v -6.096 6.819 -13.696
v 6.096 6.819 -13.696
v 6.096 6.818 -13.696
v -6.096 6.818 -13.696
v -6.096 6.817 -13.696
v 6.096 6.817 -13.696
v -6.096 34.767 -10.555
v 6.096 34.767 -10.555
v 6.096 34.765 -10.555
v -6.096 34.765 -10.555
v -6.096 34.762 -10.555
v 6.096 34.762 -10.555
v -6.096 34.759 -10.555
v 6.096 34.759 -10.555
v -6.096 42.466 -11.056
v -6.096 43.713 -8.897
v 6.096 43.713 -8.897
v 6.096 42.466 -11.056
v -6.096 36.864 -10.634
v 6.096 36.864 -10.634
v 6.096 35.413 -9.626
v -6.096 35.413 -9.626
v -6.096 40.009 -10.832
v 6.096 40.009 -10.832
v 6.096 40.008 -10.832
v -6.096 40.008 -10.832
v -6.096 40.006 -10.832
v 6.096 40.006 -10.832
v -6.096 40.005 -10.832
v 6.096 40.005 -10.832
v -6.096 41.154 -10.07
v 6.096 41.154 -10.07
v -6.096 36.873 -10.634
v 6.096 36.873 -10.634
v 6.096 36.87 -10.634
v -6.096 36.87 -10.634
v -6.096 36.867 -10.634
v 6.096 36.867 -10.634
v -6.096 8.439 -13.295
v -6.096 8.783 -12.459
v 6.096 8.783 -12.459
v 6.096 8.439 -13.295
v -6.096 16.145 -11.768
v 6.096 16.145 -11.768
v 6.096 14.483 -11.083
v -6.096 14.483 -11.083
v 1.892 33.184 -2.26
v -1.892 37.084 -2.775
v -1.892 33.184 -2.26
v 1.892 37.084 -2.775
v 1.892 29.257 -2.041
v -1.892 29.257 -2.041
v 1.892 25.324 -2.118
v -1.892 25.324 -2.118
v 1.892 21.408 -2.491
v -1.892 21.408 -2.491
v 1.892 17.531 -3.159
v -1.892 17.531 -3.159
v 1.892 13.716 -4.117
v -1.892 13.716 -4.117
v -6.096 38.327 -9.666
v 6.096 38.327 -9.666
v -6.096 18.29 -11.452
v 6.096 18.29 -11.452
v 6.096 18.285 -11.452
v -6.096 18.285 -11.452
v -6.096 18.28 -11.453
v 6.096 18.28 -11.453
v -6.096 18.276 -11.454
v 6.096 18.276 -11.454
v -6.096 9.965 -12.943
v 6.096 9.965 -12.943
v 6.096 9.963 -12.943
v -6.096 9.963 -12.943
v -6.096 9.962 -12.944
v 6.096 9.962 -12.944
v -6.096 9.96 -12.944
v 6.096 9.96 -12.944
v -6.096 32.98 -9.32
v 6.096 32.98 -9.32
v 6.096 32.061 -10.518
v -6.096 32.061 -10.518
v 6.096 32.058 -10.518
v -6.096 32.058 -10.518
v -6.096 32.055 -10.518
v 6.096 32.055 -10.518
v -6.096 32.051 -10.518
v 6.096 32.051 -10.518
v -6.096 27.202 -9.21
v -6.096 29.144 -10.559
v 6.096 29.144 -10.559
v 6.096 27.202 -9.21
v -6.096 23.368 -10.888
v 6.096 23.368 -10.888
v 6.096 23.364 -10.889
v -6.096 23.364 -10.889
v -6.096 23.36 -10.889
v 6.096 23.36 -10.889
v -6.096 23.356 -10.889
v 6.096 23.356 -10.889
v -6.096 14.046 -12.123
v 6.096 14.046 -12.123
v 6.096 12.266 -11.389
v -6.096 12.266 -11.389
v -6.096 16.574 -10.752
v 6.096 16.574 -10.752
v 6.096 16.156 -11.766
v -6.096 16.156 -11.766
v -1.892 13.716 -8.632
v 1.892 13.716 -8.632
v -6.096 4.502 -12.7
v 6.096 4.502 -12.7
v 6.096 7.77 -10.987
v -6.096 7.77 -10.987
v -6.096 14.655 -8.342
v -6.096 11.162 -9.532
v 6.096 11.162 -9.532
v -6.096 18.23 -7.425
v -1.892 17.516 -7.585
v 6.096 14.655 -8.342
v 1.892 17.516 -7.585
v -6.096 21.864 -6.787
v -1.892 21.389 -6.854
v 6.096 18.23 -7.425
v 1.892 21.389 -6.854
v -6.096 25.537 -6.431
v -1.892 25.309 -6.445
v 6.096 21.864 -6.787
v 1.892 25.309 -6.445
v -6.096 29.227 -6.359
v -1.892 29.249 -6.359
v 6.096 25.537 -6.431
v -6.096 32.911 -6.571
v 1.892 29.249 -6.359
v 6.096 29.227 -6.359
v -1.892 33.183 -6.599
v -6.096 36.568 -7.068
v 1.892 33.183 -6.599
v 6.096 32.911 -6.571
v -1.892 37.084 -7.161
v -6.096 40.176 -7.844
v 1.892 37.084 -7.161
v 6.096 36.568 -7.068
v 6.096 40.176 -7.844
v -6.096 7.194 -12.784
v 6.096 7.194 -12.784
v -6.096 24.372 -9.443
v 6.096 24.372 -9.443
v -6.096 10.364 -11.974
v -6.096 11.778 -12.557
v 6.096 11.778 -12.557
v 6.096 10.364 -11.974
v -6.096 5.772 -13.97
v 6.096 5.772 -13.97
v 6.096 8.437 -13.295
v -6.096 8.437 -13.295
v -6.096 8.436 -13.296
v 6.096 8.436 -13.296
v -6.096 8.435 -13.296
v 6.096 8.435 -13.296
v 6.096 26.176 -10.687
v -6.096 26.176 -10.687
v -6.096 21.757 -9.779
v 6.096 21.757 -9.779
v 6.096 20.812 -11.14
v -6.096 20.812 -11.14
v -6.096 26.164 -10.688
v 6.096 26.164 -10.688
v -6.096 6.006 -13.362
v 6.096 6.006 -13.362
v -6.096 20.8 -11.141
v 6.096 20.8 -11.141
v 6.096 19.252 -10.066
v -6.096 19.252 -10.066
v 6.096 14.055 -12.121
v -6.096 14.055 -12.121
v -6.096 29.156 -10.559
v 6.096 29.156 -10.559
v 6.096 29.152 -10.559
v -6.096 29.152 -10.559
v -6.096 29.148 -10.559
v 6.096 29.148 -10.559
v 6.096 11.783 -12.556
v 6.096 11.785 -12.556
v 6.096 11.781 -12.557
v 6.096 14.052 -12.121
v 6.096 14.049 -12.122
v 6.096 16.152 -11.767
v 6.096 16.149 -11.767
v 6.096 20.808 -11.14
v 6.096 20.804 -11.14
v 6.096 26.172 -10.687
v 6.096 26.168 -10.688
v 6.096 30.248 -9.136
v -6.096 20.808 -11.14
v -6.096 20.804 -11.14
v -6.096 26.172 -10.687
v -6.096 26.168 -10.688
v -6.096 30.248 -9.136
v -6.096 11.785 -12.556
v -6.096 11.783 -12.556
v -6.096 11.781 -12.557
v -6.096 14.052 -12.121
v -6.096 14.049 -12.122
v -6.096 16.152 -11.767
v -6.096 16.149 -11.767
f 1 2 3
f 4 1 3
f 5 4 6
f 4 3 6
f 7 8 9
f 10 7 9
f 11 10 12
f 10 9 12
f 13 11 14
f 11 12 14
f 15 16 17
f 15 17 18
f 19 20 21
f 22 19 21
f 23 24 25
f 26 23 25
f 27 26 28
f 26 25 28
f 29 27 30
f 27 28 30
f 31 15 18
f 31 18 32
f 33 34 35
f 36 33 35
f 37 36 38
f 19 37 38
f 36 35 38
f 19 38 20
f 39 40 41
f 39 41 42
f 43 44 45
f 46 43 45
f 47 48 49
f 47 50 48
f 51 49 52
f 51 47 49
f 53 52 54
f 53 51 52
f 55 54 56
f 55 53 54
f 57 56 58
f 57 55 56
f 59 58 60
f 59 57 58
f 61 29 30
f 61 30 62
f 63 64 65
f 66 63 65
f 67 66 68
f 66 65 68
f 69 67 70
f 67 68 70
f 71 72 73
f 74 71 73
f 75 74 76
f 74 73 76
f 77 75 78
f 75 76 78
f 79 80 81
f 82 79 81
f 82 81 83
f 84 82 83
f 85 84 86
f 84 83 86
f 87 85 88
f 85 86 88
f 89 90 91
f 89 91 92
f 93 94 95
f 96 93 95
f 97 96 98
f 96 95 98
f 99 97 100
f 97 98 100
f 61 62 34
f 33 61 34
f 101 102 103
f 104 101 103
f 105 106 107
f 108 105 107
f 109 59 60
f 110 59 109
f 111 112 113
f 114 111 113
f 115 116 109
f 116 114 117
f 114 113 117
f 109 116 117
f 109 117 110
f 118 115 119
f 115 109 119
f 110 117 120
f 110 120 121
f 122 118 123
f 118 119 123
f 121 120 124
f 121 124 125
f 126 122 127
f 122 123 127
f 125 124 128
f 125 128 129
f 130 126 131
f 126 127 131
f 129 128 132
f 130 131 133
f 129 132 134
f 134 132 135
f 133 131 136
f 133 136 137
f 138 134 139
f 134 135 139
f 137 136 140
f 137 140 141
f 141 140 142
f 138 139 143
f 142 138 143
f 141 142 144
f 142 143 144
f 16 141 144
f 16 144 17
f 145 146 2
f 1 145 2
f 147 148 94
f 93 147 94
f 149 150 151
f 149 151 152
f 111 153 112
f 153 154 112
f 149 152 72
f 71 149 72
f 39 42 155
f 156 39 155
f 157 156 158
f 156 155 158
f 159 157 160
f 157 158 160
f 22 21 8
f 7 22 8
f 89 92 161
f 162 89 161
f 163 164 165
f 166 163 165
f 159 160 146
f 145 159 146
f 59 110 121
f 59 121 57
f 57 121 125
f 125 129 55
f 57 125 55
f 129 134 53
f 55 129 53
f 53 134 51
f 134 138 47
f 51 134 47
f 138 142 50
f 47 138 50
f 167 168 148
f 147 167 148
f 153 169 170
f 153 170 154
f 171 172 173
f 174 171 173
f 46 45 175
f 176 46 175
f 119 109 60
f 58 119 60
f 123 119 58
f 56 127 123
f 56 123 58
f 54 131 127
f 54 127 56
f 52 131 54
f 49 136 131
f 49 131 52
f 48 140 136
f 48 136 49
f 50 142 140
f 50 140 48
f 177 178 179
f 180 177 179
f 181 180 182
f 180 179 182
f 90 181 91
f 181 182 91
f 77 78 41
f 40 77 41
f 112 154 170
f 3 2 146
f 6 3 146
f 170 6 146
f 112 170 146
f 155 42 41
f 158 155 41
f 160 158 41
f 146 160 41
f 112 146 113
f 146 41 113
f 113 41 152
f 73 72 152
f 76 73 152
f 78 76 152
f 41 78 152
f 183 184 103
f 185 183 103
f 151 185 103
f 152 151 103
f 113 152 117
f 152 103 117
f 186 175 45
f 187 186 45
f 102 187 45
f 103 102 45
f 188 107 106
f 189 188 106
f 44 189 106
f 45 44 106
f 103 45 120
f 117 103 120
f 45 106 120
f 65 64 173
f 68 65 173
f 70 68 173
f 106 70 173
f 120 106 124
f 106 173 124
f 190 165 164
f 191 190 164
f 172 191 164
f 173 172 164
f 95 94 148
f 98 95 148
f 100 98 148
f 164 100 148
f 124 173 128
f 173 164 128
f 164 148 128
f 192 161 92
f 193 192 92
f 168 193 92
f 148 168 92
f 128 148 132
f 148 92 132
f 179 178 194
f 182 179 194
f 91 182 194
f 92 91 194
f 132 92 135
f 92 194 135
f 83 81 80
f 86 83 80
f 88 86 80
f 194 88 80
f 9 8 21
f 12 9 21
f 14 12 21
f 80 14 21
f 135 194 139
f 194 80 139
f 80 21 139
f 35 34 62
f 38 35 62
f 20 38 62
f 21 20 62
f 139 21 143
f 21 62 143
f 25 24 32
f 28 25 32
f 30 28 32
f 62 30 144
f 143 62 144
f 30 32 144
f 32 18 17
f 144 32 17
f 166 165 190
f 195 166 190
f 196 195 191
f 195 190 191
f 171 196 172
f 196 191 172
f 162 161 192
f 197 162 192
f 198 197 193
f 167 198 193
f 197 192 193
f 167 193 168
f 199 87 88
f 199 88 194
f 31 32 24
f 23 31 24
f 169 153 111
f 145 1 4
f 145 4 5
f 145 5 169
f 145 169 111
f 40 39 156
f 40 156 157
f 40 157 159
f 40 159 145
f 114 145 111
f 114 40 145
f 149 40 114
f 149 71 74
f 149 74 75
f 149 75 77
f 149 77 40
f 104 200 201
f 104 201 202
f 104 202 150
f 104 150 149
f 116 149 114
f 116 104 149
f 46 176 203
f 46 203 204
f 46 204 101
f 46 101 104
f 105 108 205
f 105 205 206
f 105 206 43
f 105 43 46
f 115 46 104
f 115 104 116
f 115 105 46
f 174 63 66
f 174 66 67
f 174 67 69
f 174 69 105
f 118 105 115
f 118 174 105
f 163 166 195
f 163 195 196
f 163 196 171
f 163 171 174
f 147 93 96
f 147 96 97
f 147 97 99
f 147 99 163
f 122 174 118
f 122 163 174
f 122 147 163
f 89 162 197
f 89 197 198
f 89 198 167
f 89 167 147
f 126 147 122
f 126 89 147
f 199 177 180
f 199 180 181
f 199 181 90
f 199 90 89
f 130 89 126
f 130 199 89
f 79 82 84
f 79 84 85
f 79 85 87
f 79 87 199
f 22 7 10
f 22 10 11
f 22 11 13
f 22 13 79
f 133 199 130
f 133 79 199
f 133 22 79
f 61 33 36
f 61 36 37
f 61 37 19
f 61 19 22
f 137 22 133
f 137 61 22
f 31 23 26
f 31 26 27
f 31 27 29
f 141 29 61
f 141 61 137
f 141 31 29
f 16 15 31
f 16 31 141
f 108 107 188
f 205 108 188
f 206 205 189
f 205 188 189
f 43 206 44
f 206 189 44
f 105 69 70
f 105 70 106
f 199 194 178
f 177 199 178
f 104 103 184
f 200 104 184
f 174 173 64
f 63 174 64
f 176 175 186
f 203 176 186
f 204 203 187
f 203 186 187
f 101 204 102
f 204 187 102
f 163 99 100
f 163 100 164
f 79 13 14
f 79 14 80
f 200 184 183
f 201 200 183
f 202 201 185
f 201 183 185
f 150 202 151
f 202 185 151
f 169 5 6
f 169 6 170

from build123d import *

# Parameters (mm, degrees)
Y_KSEKLIK_EKSTR_ZYON1_DEPTH = 1.8922999999999999
Y_KSEKLIK_EKSTR_ZYON2_DEPTH = 6.096
KES_EKSTR_ZYON1_DEPTH       = 12.192
KES_EKSTR_ZYON2_DEPTH       = 12.192


with BuildPart() as part:
    # Sketch1 → Yükseklik-Ekstrüzyon1 (new, symmetric)
    with BuildSketch(Plane(origin=(0, 0, 0), x_dir=(0, 0, -1), z_dir=(1, 0, 0))):
        with BuildLine():
            Line((12.699999999999989, 4.50157994432155), (13.96999999999999, 5.771579944321538))
            ThreePointArc((13.969999999999999, 5.771579944321534), (10.575518689521203, 28.624343729041474), (12.431741890335203, 51.65314637694648))
            ThreePointArc((12.43174189033521, 51.65314637694648), (9.202455413232371, 44.58343593858319), (7.160995779393552, 37.0840000000003))
            Line((7.160995779393725, 37.084000000000266), (2.774818775530208, 37.08399999999997))
            ThreePointArc((2.774818775530207, 37.08399999999997), (2.117821695541153, 25.3237007401097), (4.117213446385989, 13.715999999999998))
            Line((4.117213446385993, 13.716), (8.632497278528835, 13.716000000000273))
            ThreePointArc((8.632497278528902, 13.716000000000294), (10.422987595978043, 9.001407744129583), (12.699999999999989, 4.501579944321545))
        make_face()
    extrude(amount=Y_KSEKLIK_EKSTR_ZYON1_DEPTH, both=True)

    # Sketch1<3> → Yükseklik-Ekstrüzyon2 (add, symmetric)
    with BuildSketch(Plane(origin=(0, 0, 0), x_dir=(0, 0, -1), z_dir=(1, 0, 0))):
        with BuildLine():
            Line((12.699999999999989, 4.50157994432155), (13.96999999999999, 5.771579944321538))
            ThreePointArc((13.969999999999999, 5.771579944321534), (10.575518689521203, 28.624343729041474), (12.431741890335203, 51.65314637694648))
            ThreePointArc((12.43174189033521, 51.65314637694648), (10.513707619187393, 47.83097419138011), (8.944783317600844, 43.85274189332284))
            ThreePointArc((8.944783317600837, 43.85274189332284), (7.928882036124428, 40.50105103089301), (7.160995779393787, 37.08400000000025))
            ThreePointArc((7.160995779393787, 37.08400000000025), (6.444536577927558, 25.308553187264685), (8.632497278528902, 13.716000000000294))
            ThreePointArc((8.632497278528902, 13.716000000000294), (10.422987595978043, 9.001407744129583), (12.699999999999989, 4.501579944321545))
        make_face()
    extrude(amount=Y_KSEKLIK_EKSTR_ZYON2_DEPTH, both=True)

    # Çizim1 → Kes-Ekstrüzyon1 (cut)
    with BuildSketch(Plane(origin=(6.096, 0, 0), x_dir=(0, 0, -1), z_dir=(1, 0, 0))):
        Polygon((7.619999999999999, 44.44999999999999), (15.240000000000004, 40.05059094877499), (15.239999999999997, 52.750590948774985), (7.619999999999999, 52.75059094877498), align=None)
    extrude(amount=-KES_EKSTR_ZYON1_DEPTH, mode=Mode.SUBTRACT)

    # Çizim2 → Kes-Ekstrüzyon2 (cut)
    with BuildSketch(Plane(origin=(6.096, 0, 0), x_dir=(0, 0, -1), z_dir=(1, 0, 0))):
        Polygon((11.056013618254738, 42.46621661256137), (10.070471058059045, 41.15377647398756), (10.833720947179229, 40.007340668045536), (9.666309047244985, 38.32679905568005), (10.636905522114423, 36.868919313052004), (9.62569938139432, 35.41324287335203), (10.559264155717688, 34.76472895445507), (9.3197515804638, 32.980395197122455), (10.523316237219666, 32.057512510187244), (9.135536699136821, 30.24765907263679), (10.564730983672034, 29.1517655915009), (9.210366129696242, 27.20209684513998), (10.69333307665004, 26.171932969193865), (9.442971205595295, 24.37198116560075), (10.894662465129608, 23.36354338641027), (9.778604553235667, 21.756928135312357), (11.145926492174143, 20.80709869293918), (10.065994729447585, 19.252488648378726), (11.457703407949307, 18.285718613902816), (10.75224071965595, 16.57382862778652), (11.771303497493284, 16.153877128202204), (11.082697869529728, 14.482892824629843), (12.125579376165943, 14.05312572673812), (11.389100528431403, 12.265971302634858), (12.559321579832204, 11.783728112059473), (11.974340159118404, 10.364200399535543), (12.945895778380397, 9.963826400885022), (12.459272873487201, 8.782977446397027), (13.29695037716803, 8.437774058058789), (12.784445432106818, 7.194119222949248), (13.696666965760587, 6.818196552292981), (13.362164192489386, 6.006485376927448), (13.97000000000003, 5.771579944321571), (16.641220779657644, 5.771579944321571), (16.641220779657644, 42.46621661256137), align=None)
    extrude(amount=-KES_EKSTR_ZYON2_DEPTH, mode=Mode.SUBTRACT)


solid = part.part
